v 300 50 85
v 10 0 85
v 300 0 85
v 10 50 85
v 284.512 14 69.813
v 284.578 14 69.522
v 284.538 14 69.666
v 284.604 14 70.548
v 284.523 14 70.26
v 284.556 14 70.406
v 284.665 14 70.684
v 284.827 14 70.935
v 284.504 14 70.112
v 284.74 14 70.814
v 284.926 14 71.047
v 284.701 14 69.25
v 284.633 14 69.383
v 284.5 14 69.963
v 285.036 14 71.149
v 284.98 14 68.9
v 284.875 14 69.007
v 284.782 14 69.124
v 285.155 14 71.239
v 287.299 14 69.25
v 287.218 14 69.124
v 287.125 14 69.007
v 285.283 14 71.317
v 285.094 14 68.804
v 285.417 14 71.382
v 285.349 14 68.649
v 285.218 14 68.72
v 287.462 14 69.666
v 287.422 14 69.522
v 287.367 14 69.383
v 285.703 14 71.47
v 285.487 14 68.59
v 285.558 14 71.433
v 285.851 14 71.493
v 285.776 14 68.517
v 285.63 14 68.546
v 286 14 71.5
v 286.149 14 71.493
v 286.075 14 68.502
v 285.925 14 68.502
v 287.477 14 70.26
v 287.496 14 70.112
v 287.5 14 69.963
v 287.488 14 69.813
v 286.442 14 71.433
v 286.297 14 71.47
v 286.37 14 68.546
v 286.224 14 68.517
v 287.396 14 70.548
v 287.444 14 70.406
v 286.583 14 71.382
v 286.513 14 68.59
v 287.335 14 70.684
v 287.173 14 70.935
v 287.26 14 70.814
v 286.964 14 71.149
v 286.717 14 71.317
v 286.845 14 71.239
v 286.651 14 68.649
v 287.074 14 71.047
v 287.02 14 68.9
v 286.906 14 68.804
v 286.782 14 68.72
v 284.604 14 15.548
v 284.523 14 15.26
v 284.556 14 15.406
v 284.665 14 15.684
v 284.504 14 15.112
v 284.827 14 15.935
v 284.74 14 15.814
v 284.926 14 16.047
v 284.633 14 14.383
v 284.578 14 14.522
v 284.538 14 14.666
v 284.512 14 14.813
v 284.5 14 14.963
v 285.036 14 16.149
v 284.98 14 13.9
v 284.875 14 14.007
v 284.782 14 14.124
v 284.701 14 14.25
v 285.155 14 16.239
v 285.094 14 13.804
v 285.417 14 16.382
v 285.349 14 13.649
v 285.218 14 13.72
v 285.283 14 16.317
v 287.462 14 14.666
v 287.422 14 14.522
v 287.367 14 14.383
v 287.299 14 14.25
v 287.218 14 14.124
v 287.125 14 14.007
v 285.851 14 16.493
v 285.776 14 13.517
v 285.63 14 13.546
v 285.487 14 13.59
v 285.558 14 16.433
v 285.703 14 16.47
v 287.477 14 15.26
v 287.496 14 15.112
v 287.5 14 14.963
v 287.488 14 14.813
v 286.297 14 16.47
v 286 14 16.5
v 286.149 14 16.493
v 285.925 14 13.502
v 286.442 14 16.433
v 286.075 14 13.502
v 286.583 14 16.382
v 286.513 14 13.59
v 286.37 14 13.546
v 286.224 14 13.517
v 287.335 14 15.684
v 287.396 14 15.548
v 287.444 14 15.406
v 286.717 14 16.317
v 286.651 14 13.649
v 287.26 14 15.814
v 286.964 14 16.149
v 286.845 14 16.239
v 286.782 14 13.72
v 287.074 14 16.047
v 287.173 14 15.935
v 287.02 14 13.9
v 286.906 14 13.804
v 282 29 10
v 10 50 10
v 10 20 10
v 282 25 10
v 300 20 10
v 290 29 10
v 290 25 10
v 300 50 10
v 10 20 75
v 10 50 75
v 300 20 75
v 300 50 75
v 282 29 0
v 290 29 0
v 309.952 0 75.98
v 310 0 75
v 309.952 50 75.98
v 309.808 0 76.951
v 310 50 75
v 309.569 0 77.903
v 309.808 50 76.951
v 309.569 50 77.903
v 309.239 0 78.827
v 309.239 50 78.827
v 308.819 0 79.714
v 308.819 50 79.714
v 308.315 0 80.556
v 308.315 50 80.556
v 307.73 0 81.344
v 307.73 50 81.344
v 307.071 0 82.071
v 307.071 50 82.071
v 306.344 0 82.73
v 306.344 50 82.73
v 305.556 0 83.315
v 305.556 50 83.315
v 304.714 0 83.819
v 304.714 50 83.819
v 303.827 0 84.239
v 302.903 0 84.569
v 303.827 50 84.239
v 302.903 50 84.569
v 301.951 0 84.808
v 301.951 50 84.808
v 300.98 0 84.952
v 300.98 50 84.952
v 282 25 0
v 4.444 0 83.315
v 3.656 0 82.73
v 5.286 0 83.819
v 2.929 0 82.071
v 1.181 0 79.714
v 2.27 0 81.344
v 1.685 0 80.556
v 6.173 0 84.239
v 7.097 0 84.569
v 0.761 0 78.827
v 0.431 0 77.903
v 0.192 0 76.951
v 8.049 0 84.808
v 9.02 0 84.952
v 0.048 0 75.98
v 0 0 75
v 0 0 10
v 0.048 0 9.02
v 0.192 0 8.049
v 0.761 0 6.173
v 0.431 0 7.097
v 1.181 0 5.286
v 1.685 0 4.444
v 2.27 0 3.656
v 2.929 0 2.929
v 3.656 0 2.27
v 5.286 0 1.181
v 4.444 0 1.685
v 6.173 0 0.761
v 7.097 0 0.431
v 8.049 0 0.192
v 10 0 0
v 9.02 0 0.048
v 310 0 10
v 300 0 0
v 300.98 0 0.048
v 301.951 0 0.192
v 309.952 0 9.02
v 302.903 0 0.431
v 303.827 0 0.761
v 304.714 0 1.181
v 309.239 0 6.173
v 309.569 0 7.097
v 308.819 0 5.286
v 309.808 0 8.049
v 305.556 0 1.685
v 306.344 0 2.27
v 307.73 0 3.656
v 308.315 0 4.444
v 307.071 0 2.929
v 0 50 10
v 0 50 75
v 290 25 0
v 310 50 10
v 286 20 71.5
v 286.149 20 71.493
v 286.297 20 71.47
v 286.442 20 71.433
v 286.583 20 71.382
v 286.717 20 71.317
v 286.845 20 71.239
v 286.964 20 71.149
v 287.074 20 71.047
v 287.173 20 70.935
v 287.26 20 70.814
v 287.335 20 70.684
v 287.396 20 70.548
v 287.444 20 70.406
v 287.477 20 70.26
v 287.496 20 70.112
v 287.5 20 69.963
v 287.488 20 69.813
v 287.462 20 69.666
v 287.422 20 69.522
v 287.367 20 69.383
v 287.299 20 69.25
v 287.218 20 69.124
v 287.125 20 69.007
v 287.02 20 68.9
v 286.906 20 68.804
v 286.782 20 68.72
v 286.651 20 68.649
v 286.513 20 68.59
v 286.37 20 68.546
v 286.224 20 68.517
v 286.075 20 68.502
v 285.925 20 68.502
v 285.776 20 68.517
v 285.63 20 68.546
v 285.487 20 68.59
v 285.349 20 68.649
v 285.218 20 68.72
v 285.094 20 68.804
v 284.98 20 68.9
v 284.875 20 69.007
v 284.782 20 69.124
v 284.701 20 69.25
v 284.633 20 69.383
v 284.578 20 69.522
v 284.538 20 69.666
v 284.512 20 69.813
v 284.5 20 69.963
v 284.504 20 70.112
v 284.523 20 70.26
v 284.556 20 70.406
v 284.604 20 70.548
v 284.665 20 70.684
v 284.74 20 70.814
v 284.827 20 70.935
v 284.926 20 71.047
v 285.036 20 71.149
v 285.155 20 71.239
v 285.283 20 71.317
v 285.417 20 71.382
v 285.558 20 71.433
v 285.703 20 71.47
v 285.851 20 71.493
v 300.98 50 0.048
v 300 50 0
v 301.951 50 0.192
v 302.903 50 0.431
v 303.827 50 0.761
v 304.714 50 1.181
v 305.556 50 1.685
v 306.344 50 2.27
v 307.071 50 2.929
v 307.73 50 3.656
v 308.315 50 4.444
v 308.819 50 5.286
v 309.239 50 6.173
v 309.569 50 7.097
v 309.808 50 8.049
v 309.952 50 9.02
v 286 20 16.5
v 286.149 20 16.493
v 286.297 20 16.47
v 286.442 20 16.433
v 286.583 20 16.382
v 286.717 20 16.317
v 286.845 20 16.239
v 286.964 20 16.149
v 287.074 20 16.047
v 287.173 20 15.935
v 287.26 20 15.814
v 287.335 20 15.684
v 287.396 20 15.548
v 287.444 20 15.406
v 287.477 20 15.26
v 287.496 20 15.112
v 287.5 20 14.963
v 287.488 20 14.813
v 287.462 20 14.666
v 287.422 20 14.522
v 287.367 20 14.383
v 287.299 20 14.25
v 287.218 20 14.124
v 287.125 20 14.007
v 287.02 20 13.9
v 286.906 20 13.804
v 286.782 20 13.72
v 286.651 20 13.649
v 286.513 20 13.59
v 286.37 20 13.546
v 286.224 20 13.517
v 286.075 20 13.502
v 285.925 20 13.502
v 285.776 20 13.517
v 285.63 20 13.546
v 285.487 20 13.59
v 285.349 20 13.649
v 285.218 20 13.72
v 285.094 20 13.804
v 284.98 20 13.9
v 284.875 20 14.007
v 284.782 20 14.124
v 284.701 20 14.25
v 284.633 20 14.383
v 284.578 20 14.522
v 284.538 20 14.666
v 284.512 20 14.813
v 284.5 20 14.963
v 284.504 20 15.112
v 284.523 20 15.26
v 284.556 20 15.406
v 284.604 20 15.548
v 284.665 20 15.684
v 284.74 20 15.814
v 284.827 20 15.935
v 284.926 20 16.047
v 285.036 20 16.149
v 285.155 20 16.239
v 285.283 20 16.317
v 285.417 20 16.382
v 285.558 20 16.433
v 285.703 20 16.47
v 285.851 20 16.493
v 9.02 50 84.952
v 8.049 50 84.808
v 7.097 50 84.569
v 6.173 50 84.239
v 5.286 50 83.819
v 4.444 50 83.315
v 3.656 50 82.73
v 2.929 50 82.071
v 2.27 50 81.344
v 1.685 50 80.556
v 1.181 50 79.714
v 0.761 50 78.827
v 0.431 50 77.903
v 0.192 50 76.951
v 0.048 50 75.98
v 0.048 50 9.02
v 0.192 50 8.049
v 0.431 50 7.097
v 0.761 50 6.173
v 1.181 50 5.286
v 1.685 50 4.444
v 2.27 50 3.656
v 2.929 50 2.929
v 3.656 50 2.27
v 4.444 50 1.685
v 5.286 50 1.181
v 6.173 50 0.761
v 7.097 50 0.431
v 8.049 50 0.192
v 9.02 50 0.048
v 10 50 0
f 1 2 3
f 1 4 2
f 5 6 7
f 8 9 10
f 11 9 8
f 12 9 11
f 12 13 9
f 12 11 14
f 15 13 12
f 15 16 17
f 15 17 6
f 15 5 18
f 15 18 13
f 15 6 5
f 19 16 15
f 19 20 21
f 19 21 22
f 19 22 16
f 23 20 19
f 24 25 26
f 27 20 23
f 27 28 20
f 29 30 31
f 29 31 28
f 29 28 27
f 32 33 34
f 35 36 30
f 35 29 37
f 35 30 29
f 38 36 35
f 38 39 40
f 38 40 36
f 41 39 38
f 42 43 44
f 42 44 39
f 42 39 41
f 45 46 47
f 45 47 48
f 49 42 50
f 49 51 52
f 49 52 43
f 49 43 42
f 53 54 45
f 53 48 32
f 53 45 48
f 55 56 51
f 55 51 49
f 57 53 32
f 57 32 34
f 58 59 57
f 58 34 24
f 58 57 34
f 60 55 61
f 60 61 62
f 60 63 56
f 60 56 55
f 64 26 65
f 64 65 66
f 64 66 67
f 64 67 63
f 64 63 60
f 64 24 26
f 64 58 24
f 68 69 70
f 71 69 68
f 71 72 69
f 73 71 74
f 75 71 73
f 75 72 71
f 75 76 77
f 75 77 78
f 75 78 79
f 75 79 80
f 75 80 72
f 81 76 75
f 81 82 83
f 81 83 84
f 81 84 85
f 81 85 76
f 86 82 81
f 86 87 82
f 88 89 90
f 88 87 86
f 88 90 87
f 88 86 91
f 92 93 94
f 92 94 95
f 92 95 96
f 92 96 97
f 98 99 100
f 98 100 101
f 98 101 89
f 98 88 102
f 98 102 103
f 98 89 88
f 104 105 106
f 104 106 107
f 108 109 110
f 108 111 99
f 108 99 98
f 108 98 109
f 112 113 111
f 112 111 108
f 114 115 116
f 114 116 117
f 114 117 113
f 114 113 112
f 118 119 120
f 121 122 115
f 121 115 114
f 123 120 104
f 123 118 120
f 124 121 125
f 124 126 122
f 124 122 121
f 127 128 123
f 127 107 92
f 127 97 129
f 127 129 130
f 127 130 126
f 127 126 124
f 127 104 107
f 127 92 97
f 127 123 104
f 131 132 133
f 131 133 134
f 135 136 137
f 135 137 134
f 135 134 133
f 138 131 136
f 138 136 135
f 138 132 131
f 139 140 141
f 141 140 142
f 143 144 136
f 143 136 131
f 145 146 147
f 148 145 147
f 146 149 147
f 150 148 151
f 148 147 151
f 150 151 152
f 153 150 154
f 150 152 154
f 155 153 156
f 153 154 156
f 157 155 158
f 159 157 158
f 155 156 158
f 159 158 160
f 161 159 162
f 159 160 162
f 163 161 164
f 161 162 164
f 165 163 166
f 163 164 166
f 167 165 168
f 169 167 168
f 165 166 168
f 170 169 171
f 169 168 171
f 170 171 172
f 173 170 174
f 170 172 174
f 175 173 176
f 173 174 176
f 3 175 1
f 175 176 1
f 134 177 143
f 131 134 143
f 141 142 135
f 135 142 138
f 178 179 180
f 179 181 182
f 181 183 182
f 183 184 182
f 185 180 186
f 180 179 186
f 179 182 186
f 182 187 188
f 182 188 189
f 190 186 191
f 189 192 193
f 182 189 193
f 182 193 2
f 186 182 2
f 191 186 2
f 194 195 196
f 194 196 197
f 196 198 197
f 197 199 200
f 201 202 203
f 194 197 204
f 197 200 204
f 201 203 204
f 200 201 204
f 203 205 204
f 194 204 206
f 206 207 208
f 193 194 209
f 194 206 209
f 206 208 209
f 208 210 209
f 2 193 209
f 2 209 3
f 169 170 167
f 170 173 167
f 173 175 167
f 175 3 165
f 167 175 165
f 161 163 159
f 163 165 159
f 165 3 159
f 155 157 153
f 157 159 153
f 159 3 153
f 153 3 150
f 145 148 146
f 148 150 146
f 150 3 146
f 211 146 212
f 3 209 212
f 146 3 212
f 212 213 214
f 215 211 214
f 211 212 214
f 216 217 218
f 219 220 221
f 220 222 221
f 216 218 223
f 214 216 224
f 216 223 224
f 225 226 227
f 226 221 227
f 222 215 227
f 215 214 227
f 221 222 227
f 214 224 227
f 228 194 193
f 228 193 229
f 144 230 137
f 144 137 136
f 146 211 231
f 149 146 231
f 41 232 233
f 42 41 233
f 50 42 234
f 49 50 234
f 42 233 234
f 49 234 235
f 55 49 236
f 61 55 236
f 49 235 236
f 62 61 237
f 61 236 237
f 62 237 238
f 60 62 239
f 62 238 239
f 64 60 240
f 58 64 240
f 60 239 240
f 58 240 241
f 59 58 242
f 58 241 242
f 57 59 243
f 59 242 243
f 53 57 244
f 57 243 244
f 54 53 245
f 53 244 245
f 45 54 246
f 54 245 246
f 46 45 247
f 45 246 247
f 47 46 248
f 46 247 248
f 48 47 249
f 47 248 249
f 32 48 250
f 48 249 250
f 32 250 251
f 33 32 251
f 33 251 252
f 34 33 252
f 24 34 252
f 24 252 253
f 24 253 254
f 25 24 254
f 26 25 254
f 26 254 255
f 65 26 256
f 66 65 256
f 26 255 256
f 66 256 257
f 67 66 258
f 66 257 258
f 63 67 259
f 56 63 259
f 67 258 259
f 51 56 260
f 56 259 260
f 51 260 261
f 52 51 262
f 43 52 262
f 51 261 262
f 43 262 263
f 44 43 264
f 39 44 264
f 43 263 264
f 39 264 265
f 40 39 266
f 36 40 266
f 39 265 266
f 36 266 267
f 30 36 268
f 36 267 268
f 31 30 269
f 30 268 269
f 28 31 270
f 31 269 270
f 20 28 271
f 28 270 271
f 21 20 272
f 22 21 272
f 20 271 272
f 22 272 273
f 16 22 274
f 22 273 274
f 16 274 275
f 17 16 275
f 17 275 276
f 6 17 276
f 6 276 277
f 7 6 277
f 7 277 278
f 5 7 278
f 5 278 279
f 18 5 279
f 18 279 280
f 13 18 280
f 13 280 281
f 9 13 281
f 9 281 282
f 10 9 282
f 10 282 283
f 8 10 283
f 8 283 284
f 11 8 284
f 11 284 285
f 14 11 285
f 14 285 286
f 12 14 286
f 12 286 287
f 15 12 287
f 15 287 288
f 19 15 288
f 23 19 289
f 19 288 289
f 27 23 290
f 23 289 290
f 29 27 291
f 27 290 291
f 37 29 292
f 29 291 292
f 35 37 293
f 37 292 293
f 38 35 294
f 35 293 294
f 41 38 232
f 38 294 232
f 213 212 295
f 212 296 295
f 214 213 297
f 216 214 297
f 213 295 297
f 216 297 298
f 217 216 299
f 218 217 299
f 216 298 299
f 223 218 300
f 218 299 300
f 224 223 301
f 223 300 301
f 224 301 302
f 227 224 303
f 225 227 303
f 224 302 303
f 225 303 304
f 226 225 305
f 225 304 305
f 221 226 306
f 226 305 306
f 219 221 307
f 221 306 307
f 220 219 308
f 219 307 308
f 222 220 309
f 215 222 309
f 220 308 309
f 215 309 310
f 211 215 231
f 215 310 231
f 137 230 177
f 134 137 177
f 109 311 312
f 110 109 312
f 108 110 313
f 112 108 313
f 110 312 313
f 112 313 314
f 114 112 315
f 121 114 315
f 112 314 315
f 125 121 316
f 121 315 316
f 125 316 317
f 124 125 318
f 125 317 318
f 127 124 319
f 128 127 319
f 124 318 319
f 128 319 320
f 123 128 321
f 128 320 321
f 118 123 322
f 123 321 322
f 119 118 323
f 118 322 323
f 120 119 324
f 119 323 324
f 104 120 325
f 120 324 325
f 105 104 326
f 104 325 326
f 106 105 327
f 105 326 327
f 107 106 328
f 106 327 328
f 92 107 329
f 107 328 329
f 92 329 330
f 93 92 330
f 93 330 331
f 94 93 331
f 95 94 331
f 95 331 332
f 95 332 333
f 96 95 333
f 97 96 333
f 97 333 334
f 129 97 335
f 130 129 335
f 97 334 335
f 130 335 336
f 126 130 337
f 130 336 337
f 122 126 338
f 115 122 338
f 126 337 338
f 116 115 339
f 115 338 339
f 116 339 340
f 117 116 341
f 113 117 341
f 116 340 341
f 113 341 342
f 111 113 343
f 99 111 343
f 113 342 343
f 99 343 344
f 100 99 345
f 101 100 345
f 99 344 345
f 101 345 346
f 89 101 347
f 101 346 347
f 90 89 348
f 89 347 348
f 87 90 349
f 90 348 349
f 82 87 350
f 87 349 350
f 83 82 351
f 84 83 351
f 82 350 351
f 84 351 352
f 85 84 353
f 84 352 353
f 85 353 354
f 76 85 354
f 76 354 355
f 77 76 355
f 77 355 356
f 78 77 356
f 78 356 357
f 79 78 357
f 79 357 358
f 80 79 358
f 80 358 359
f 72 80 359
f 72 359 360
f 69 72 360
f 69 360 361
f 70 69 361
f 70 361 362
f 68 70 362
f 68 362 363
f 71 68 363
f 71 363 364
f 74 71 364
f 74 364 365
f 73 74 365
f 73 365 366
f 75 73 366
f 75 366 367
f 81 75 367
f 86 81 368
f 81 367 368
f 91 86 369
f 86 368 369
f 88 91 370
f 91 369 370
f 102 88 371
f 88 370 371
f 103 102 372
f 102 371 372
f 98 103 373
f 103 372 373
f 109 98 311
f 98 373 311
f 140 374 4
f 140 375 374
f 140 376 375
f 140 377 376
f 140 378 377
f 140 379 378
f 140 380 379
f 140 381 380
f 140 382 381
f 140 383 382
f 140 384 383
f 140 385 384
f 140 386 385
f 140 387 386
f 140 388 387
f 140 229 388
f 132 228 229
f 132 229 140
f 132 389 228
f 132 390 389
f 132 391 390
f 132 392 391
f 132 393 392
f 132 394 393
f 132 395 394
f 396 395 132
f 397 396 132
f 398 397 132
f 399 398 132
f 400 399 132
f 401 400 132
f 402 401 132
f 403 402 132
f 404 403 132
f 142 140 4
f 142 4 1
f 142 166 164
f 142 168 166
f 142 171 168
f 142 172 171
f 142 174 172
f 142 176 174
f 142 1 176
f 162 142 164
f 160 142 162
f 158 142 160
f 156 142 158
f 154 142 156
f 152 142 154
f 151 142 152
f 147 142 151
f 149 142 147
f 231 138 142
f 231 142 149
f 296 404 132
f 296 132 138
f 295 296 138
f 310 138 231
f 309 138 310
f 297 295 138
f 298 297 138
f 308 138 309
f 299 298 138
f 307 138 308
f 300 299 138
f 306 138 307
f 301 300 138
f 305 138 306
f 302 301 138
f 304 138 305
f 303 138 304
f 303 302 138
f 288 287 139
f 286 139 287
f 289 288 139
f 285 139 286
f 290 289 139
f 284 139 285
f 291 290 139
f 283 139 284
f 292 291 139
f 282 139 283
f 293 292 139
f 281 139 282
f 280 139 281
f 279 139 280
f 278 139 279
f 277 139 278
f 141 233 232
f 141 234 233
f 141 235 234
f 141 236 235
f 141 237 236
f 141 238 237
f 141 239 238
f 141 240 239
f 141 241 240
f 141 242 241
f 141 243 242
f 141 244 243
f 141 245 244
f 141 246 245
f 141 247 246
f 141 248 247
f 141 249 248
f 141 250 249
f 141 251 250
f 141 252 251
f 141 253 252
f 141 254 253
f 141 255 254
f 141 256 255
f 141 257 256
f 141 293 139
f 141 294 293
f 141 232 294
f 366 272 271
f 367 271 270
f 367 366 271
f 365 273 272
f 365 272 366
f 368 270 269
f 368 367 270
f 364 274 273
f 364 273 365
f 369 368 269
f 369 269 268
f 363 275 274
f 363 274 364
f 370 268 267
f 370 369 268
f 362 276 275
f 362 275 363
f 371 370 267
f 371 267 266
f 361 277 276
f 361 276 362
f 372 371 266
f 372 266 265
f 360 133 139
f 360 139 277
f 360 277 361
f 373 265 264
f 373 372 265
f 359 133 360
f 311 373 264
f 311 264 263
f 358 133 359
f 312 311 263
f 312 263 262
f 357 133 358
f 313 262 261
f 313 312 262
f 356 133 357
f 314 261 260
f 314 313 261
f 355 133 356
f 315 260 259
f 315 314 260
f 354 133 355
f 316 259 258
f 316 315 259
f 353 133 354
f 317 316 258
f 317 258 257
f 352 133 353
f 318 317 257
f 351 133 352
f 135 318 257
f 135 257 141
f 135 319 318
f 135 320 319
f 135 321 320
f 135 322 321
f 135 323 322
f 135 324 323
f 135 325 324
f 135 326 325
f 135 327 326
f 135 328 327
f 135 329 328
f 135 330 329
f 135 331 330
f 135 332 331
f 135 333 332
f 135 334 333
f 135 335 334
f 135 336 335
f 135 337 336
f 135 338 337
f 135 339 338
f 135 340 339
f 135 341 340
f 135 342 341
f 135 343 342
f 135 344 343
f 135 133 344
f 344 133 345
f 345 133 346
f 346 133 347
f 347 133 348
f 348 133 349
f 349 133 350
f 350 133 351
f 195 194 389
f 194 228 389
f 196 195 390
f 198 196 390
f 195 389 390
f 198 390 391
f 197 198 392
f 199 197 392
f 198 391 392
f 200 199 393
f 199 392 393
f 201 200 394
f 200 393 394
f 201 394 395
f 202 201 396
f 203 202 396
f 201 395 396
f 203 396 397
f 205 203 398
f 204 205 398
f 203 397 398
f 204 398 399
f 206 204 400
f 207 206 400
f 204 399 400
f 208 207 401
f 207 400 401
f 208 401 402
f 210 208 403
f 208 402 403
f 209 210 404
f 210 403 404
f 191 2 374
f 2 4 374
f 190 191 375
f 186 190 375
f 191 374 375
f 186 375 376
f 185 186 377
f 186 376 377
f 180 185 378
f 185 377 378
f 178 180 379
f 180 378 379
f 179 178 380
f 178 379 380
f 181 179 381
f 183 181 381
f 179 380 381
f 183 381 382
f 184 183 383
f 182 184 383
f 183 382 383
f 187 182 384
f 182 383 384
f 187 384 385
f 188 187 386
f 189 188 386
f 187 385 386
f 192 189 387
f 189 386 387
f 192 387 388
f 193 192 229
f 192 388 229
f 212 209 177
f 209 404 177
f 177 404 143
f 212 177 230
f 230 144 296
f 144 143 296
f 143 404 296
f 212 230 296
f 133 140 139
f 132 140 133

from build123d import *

# Parameters (mm, degrees)
SKIZZE2_W                       = 310
SKIZZE2_H                       = 50
AUFSATZ_LINEAR_AUSTRAGEN1_DEPTH = 85
SKIZZE4_W                       = 290
SKIZZE4_H                       = 65
SCHNITT_LINEAR_AUSTRAGEN1_DEPTH = 30
VERRUNDUNG1_R                   = 10
VERRUNDUNG2_R                   = 10
VERRUNDUNG3_R                   = 10
VERRUNDUNG4_R                   = 10
SKIZZE9_W                       = 8
SKIZZE9_H                       = 4
SCHNITT_LINEAR_AUSTRAGEN2_DEPTH = 10
SKIZZE10_R                      = 1.5
SCHNITT_LINEAR_AUSTRAGEN3_DEPTH = 6


with BuildPart() as part:
    # Skizze2 → Aufsatz-Linear austragen1 (new body)
    with BuildSketch(Plane.XY):
        with Locations((155, 25)):
            Rectangle(SKIZZE2_W, SKIZZE2_H)
    extrude(amount=AUFSATZ_LINEAR_AUSTRAGEN1_DEPTH)

    # Skizze4 → Schnitt-Linear austragen1 (cut)
    with BuildSketch(Plane(origin=(0, 50, 0), x_dir=(1, 0, 0), z_dir=(0, 1, 0))):
        with Locations((155, -42.5)):
            Rectangle(SKIZZE4_W, SKIZZE4_H)
    extrude(amount=-SCHNITT_LINEAR_AUSTRAGEN1_DEPTH, mode=Mode.SUBTRACT)

    # Verrundung1
    verrundung1_edges = [part.edges().sort_by_distance(p)[0] for p in [
        (310, 25, 0),
    ]]
    fillet(verrundung1_edges, radius=VERRUNDUNG1_R)

    # Verrundung2
    verrundung2_edges = [part.edges().sort_by_distance(p)[0] for p in [
        (310, 25, 85),
    ]]
    fillet(verrundung2_edges, radius=VERRUNDUNG2_R)

    # Verrundung3
    verrundung3_edges = [part.edges().sort_by_distance(p)[0] for p in [
        (0, 25, 85),
    ]]
    fillet(verrundung3_edges, radius=VERRUNDUNG3_R)

    # Verrundung4
    verrundung4_edges = [part.edges().sort_by_distance(p)[0] for p in [
        (0, 25, 0),
    ]]
    fillet(verrundung4_edges, radius=VERRUNDUNG4_R)

    # Skizze9 → Schnitt-Linear austragen2 (cut)
    with BuildSketch(Plane(origin=(0, 0, 0), x_dir=(-1, 0, 0), z_dir=(0, 0, -1))):
        with Locations((-286, 27)):
            Rectangle(SKIZZE9_W, SKIZZE9_H)
    extrude(amount=-SCHNITT_LINEAR_AUSTRAGEN2_DEPTH, mode=Mode.SUBTRACT)

    # Skizze10 → Schnitt-Linear austragen3 (cut)
    with BuildSketch(Plane(origin=(0, 20, 0), x_dir=(1, 0, 0), z_dir=(0, 1, 0))):
        with Locations(Location((286, -15, 0), (0, 0, 270))):
            Circle(SKIZZE10_R)
        with Locations(Location((286, -70, 0), (0, 0, 270))):
            Circle(SKIZZE10_R)
    extrude(amount=-SCHNITT_LINEAR_AUSTRAGEN3_DEPTH, mode=Mode.SUBTRACT)


solid = part.part
